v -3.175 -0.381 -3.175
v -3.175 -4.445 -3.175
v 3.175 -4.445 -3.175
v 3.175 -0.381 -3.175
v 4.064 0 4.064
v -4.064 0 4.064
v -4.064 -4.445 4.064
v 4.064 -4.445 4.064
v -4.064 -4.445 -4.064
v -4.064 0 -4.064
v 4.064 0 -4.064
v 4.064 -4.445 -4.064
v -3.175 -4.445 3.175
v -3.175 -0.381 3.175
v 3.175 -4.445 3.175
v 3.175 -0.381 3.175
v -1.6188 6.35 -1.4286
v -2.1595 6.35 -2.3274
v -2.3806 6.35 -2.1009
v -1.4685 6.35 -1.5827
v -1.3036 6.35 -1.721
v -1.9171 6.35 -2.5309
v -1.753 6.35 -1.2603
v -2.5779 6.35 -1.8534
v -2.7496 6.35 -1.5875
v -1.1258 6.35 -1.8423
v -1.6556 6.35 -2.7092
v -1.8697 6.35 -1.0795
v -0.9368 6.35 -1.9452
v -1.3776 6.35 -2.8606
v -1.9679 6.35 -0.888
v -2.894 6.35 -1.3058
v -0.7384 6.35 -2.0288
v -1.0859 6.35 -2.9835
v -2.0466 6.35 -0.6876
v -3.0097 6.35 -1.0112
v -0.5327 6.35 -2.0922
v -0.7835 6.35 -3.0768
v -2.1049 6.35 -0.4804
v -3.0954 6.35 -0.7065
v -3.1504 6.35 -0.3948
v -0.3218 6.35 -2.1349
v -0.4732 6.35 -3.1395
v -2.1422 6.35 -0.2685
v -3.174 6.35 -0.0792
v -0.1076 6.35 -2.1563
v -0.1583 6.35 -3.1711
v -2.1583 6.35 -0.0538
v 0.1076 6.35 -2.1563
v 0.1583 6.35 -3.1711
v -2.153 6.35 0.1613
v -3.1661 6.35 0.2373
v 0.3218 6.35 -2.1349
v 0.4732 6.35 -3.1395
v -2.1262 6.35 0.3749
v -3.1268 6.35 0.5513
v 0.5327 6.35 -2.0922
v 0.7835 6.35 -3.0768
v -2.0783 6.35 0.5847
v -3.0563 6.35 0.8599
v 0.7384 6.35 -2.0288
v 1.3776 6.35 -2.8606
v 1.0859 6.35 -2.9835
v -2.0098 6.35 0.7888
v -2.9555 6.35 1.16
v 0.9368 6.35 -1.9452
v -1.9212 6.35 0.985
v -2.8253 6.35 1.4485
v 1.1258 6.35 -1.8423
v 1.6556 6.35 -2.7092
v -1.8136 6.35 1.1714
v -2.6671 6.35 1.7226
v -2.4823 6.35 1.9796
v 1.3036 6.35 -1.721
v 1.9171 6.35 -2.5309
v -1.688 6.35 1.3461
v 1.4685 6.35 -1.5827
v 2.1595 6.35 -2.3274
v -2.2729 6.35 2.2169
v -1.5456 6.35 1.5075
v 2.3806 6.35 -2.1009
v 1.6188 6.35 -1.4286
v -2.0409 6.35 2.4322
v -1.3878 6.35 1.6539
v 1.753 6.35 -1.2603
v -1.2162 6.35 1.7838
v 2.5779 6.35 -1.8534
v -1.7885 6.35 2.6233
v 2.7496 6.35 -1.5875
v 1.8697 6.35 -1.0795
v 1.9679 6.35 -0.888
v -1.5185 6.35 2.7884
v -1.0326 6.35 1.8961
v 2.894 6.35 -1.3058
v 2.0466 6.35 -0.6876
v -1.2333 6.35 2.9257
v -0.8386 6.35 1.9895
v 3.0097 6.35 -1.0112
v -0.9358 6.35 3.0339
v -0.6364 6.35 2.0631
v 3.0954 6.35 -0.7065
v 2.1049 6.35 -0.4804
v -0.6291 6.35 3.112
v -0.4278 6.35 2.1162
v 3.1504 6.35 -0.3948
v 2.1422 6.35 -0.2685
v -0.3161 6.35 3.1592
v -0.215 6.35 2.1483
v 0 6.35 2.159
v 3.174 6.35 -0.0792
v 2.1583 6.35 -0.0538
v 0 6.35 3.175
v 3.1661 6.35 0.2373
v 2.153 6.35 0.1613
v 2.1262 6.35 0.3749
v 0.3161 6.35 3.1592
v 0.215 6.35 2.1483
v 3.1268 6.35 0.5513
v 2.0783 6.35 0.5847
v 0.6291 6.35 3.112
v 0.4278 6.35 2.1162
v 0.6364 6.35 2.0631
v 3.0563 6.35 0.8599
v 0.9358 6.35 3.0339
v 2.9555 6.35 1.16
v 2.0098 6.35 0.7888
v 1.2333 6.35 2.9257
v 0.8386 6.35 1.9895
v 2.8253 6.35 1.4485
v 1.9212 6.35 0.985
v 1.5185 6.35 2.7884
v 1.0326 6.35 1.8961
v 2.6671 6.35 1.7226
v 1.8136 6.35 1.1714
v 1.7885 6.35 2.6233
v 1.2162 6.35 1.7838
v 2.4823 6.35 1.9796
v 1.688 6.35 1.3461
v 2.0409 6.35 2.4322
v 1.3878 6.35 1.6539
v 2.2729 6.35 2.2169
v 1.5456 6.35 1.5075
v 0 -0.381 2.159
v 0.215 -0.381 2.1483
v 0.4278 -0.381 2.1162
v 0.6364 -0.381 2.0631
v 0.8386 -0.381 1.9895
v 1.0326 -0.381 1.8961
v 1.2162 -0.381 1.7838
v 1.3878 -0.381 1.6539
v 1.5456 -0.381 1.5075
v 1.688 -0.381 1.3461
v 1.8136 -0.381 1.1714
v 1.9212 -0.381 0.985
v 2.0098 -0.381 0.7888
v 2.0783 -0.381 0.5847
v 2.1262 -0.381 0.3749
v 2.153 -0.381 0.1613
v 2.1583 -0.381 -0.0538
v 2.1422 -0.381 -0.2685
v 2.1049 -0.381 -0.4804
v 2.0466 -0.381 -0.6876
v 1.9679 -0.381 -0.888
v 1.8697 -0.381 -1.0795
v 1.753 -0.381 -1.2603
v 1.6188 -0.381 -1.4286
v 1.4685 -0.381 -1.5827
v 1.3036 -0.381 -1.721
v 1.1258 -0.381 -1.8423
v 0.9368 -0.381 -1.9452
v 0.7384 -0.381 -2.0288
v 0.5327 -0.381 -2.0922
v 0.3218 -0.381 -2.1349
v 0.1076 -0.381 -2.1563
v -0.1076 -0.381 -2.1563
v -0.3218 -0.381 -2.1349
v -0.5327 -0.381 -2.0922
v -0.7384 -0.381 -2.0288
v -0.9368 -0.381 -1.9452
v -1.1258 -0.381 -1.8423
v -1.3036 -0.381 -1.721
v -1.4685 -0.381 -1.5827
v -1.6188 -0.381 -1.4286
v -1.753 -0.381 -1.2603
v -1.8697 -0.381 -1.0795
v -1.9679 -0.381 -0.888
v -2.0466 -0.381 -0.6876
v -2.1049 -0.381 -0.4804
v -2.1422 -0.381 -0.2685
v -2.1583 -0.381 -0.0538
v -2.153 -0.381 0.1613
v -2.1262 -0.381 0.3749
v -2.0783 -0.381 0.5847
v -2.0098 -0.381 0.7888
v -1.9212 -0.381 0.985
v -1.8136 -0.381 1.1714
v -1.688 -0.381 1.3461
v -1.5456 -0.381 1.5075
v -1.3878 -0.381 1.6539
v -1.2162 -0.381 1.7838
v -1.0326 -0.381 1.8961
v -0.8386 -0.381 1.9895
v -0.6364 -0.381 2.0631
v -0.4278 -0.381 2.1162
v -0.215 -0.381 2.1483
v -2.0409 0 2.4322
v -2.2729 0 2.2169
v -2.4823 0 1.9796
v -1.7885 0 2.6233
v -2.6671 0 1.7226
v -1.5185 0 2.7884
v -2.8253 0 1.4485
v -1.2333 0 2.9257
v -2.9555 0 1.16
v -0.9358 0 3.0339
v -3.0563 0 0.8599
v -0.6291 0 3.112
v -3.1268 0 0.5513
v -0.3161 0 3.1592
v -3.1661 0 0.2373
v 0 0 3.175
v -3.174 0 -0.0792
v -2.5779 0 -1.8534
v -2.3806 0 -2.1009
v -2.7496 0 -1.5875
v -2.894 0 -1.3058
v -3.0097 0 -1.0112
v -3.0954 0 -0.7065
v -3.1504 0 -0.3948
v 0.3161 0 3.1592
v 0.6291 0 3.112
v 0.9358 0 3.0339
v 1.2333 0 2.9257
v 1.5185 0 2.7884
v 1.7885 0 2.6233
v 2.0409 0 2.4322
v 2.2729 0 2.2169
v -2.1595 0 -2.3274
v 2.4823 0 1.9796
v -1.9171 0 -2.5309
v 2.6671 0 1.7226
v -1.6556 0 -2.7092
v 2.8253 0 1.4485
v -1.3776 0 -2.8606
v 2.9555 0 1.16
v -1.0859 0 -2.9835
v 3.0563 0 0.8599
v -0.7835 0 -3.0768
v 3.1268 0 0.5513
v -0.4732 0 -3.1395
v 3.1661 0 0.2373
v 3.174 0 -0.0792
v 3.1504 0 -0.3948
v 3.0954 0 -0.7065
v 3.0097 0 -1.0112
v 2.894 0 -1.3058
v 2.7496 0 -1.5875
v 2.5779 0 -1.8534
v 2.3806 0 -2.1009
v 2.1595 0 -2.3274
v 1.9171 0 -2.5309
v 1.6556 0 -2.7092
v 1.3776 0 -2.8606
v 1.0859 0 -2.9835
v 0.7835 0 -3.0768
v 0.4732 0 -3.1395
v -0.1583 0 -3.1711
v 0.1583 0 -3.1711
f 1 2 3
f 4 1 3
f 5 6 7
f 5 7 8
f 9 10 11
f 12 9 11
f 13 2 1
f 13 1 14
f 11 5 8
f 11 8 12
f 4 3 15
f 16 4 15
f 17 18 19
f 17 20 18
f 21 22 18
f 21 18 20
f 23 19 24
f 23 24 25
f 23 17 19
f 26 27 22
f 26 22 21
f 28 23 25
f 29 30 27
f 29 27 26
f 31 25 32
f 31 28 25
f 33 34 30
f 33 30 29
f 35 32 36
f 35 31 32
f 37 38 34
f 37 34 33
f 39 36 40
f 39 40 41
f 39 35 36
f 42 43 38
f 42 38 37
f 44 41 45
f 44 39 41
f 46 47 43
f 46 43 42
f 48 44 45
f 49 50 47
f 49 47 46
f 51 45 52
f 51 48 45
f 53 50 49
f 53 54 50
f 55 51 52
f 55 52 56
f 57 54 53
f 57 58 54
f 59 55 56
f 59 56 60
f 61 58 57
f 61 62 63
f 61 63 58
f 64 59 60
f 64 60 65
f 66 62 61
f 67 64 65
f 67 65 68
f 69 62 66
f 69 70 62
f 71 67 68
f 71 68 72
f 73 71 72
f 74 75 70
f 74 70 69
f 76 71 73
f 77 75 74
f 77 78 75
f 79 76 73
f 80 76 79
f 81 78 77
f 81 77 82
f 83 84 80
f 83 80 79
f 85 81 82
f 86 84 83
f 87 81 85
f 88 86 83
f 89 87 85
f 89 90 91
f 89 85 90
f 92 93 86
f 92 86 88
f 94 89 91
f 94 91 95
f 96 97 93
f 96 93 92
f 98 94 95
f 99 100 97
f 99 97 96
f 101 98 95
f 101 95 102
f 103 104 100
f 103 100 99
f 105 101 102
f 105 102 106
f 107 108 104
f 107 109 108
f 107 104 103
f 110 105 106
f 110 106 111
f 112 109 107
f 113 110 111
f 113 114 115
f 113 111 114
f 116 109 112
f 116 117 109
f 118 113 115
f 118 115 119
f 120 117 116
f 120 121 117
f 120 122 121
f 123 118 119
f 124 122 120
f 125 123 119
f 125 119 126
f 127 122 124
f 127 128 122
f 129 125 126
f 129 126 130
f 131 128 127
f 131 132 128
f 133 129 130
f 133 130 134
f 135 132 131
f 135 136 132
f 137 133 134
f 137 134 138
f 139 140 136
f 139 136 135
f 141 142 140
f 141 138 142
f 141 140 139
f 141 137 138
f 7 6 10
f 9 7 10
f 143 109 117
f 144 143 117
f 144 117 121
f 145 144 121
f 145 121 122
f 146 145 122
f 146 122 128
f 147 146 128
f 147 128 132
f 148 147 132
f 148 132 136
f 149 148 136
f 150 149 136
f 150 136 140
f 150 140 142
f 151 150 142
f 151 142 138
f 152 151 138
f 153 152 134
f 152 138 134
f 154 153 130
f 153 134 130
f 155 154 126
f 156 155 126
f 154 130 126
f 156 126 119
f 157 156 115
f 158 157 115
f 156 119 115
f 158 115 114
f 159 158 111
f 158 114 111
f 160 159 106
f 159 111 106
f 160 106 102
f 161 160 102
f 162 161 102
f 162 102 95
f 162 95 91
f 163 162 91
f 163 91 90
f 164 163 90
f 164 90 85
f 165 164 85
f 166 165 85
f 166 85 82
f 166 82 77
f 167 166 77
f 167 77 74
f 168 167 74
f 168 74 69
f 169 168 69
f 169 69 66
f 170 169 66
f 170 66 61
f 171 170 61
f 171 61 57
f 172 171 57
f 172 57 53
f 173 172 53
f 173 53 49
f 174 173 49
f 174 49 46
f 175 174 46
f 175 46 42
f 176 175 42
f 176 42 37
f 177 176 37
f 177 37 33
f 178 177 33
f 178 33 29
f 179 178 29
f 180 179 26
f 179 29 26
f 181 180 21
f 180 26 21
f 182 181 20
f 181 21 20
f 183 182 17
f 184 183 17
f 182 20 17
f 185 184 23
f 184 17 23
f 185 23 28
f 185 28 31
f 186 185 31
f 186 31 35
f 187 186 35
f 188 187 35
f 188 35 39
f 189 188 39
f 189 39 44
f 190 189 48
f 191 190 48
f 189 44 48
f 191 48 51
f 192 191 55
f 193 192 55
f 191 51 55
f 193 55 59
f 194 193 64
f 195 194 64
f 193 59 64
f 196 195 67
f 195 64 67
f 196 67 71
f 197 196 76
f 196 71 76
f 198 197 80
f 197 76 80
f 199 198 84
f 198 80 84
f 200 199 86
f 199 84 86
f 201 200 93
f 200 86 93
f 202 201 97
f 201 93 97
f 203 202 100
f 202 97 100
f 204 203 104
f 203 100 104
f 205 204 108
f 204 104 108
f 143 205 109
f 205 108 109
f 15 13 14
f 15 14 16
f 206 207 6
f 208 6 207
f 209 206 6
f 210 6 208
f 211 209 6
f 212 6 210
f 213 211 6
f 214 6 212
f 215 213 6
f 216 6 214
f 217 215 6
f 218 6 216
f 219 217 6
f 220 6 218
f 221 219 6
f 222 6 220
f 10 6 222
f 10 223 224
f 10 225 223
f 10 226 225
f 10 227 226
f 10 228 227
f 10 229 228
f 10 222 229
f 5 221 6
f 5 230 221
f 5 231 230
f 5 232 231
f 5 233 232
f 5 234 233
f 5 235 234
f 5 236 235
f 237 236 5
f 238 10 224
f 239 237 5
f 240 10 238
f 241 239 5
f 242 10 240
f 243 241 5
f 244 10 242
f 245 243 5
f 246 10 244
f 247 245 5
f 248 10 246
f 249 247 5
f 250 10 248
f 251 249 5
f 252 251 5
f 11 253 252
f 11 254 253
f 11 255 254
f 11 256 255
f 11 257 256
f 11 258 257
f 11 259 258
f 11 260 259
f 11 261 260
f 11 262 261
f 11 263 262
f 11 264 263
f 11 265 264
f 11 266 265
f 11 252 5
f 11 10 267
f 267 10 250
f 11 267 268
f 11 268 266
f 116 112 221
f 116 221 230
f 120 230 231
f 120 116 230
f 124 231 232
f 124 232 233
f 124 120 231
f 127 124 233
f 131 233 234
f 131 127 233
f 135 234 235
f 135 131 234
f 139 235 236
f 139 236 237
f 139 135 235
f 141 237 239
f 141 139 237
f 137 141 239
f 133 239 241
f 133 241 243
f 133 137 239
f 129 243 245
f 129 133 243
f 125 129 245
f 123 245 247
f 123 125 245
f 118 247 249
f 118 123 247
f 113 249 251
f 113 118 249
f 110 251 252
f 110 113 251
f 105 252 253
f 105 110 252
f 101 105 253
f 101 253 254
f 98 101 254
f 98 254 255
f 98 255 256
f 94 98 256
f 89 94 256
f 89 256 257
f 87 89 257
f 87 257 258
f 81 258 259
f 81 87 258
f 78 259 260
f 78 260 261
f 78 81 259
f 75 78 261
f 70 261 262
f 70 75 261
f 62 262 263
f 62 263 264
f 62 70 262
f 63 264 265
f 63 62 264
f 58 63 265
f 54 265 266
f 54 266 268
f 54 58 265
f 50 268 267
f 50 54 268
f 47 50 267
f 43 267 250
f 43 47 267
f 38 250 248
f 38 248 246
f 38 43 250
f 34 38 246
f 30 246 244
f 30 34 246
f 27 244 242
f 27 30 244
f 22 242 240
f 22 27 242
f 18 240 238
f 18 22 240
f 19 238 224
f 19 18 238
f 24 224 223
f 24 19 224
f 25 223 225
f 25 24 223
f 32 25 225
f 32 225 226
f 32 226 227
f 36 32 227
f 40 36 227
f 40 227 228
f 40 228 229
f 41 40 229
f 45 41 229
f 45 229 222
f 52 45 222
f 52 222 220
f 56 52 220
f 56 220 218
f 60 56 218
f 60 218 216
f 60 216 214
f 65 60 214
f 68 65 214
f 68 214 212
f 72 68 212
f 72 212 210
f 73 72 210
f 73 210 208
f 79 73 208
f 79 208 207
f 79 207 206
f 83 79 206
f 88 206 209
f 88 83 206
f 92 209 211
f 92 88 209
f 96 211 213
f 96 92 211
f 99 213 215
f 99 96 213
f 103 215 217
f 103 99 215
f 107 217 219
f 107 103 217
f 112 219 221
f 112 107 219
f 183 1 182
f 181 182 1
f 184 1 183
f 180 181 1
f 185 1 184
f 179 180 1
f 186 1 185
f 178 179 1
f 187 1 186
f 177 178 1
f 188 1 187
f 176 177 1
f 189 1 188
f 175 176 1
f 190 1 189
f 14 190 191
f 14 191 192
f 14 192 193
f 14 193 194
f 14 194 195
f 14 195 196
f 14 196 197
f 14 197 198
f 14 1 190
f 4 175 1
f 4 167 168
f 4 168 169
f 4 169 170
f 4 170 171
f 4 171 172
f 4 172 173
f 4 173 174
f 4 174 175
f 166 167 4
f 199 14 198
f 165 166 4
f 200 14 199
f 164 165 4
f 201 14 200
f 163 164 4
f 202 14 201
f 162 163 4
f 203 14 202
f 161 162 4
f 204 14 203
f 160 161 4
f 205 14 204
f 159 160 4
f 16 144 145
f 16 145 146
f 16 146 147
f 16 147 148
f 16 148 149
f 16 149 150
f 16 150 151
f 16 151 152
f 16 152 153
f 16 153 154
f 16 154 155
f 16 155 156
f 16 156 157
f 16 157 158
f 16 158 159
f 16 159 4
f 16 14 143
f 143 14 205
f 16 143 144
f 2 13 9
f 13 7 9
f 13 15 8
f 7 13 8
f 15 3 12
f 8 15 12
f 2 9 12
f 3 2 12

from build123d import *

# Parameters (mm, degrees)
SKETCH1_W           = 8.128
SKETCH1_H           = 8.128
BOSS_EXTRUDE1_DEPTH = 4.445
SKETCH2_W           = 6.35
SKETCH2_H           = 6.35
CUT_EXTRUDE1_DEPTH  = 4.064
SKETCH3_R           = 2.159
CUT_EXTRUDE2_DEPTH  = 8.265687648
BOSS_EXTRUDE2_START = 6.35
SKETCH4_R           = 3.175
SKETCH4_R_2         = 2.159
BOSS_EXTRUDE2_DEPTH = 6.35


with BuildPart() as part:
    # Sketch1 → Boss-Extrude1 (new body)
    with BuildSketch(Plane(origin=(0, 0, 0), x_dir=(1, 0, 0), z_dir=(0, 1, 0))):
        Rectangle(SKETCH1_W, SKETCH1_H)
    extrude(amount=-BOSS_EXTRUDE1_DEPTH)

    # Sketch2 → Cut-Extrude1 (cut)
    with BuildSketch(Plane.XZ.offset(4.445)):
        Rectangle(SKETCH2_W, SKETCH2_H)
    extrude(amount=-CUT_EXTRUDE1_DEPTH, mode=Mode.SUBTRACT)

    # Sketch3 → Cut-Extrude2 (cut, through all)
    with BuildSketch(Plane(origin=(0, 0, 0), x_dir=(1, 0, 0), z_dir=(0, 1, 0))):
        Circle(SKETCH3_R)
    extrude(amount=-CUT_EXTRUDE2_DEPTH, mode=Mode.SUBTRACT)

    # Sketch4 → Boss-Extrude2 (add)
    with BuildSketch(Plane(origin=(0, 0, 0), x_dir=(1, 0, 0), z_dir=(0, 1, 0)).offset(BOSS_EXTRUDE2_START)):
        Circle(SKETCH4_R)
        Circle(SKETCH4_R_2, mode=Mode.SUBTRACT)
    extrude(amount=-BOSS_EXTRUDE2_DEPTH)


solid = part.part
